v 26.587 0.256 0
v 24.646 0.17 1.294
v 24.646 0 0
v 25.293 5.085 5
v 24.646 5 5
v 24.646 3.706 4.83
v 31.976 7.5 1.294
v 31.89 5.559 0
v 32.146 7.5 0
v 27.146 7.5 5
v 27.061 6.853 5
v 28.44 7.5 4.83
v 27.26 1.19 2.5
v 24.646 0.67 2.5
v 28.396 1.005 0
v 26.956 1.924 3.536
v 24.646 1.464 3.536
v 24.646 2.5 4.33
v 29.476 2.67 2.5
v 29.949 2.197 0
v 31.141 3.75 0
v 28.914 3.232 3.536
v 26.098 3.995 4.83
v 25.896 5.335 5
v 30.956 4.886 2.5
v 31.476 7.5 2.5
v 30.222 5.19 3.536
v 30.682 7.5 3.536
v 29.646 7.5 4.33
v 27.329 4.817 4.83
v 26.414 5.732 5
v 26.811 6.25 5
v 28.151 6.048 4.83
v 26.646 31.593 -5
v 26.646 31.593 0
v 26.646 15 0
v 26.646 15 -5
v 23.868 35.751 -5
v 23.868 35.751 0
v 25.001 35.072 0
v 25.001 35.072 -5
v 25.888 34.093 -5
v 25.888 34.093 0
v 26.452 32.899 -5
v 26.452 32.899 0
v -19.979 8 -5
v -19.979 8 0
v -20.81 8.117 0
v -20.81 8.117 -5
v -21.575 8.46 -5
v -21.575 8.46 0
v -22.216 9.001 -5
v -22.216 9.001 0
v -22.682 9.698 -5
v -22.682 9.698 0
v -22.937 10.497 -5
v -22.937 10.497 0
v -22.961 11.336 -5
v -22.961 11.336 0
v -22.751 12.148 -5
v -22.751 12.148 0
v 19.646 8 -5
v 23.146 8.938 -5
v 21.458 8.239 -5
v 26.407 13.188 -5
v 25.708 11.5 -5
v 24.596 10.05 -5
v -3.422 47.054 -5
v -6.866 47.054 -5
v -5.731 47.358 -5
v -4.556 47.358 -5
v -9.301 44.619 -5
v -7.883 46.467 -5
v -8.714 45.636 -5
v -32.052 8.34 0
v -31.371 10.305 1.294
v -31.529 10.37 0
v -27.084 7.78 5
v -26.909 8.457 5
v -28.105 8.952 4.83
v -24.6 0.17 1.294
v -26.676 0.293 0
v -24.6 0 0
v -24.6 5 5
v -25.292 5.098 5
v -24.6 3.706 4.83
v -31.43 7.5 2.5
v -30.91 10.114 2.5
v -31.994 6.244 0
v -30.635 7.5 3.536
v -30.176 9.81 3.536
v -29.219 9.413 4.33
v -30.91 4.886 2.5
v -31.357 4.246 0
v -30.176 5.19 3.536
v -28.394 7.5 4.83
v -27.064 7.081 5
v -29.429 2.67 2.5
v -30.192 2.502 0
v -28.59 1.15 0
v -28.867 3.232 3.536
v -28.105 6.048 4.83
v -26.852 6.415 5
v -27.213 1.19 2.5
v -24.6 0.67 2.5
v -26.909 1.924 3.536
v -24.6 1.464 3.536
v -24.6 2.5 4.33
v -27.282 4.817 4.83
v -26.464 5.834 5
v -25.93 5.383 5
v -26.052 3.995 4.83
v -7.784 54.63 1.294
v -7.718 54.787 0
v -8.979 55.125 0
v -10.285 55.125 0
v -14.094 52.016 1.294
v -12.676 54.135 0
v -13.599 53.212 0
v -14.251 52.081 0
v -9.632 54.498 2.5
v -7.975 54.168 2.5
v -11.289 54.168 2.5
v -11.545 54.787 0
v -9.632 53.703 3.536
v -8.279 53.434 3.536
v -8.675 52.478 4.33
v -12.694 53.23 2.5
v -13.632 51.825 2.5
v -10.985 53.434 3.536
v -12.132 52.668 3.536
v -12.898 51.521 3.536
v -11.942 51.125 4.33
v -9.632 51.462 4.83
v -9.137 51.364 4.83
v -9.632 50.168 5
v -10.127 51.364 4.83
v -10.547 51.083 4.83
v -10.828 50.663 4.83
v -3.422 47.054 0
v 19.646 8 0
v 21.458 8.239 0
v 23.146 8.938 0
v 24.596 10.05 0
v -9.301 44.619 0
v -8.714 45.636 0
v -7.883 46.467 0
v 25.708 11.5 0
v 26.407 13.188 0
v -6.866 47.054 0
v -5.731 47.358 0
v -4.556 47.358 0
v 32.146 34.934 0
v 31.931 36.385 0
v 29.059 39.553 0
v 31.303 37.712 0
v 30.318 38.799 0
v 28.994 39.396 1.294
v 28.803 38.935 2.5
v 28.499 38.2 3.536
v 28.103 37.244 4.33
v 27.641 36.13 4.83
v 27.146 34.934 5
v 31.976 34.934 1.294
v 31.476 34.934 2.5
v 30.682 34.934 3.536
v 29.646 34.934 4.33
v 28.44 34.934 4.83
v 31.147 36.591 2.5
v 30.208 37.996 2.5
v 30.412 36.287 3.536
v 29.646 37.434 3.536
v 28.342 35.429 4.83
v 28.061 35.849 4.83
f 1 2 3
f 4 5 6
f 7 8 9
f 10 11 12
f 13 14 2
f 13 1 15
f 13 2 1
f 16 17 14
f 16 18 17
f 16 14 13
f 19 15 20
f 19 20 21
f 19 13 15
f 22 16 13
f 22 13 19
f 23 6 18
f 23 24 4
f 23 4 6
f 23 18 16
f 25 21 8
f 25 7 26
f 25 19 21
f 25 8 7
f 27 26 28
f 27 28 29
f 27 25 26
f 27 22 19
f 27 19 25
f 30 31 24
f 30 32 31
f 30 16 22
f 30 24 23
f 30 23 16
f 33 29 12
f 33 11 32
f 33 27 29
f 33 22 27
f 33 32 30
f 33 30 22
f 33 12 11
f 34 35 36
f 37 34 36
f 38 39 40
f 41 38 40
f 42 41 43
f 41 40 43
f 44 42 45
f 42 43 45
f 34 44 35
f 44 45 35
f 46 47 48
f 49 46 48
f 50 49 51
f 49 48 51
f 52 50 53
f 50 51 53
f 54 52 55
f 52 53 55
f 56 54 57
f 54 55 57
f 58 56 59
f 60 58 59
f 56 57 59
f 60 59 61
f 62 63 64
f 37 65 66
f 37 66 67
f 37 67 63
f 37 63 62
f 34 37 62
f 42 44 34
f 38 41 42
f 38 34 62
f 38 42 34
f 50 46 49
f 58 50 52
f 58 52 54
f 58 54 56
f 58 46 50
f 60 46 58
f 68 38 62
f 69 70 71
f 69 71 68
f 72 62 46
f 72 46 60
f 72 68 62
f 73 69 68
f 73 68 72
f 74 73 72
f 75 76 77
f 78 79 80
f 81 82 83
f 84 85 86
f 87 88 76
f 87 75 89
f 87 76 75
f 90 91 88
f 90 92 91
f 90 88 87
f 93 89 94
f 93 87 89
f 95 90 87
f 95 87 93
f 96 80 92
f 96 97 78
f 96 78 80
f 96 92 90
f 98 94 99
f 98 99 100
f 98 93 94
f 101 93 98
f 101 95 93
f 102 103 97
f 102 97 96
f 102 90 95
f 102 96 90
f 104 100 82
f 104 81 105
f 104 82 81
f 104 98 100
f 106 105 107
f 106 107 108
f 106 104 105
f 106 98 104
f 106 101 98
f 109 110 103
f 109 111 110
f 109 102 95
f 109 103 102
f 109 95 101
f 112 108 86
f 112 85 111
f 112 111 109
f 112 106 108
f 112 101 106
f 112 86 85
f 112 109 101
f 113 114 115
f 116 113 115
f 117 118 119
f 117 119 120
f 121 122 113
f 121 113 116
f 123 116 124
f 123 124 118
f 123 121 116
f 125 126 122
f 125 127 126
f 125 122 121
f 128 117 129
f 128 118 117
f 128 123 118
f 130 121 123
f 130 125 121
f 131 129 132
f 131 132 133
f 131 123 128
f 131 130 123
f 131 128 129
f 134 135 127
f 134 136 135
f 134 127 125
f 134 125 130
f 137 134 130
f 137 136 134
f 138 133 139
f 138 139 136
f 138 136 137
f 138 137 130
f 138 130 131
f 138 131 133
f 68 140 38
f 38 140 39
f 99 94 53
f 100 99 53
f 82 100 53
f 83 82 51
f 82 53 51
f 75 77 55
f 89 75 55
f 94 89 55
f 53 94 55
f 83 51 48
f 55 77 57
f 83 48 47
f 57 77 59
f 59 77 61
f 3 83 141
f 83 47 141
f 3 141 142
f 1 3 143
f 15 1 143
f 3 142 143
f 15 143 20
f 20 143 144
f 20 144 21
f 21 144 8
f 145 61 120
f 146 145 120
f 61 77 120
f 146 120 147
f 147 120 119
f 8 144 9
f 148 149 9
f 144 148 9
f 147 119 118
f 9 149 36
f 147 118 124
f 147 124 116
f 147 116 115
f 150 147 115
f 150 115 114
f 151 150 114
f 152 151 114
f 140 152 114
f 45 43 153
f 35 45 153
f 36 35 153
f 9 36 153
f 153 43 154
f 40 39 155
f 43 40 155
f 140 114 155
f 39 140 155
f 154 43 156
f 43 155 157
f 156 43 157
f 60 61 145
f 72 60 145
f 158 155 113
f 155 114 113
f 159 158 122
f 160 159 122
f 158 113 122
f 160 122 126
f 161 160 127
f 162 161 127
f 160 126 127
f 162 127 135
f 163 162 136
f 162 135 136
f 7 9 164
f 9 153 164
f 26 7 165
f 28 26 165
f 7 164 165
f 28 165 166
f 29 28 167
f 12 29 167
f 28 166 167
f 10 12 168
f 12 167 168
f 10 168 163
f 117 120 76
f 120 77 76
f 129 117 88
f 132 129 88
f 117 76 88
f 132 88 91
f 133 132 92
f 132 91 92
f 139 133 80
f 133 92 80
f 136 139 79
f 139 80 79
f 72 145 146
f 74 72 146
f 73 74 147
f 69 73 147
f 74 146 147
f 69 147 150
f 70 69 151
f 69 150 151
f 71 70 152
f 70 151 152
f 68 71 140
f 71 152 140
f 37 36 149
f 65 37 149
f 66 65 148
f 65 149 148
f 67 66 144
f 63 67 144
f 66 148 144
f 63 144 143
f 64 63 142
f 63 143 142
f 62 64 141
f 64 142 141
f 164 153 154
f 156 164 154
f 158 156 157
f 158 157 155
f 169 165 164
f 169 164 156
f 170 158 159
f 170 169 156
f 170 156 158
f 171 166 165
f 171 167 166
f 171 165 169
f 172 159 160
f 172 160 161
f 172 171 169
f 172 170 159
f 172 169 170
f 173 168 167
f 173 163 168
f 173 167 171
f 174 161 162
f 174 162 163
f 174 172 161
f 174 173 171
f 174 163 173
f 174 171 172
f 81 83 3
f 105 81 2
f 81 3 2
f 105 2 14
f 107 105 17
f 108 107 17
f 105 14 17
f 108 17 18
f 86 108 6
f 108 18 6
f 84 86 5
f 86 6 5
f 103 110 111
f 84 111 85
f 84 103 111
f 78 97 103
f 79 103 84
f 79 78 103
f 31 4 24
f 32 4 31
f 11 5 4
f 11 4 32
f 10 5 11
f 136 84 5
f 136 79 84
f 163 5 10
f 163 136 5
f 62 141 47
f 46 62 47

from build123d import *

# Parameters (mm, degrees)
BOSS_EXTRUDE1_DEPTH = 5
BOSS_EXTRUDE2_DEPTH = 5
FILLET1_R           = 5


with BuildPart() as part:
    # Sketch1 → Boss-Extrude1 (new body)
    # profile 1 of 3: a face of its own
    with BuildSketch(Plane.XY):
        with BuildLine():
            Line((32.146013204, 7.5), (32.146013204, 34.934018325))
            ThreePointArc((32.146013204, 34.934018325), (31.303361266, 37.71186949), (29.059430366, 39.553415988))
            Line((29.059430366, 39.553415988), (-7.718495765, 54.787331787))
            ThreePointArc((-7.718495765, 54.787331787), (-11.545330089, 54.787331787), (-14.25131059, 52.081351287))
            Line((-14.25131059, 52.081351287), (-31.528665913, 10.370125743))
            ThreePointArc((-31.528665913, 10.370125743), (-30.835591512, 3.333223252), (-24.599569419, 0))
            Line((-24.599569419, 0), (24.646013204, 0))
            ThreePointArc((24.646013204, 0), (29.949314063, 2.196699141), (32.146013204, 7.5))
        make_face()
        with BuildLine():
            ThreePointArc((27.146013204, 31.593125136), (26.303361266, 34.370976301), (24.059430366, 36.212522798))
            Line((24.059430366, 36.212522798), (-3.230262498, 47.516283695))
            ThreePointArc((-3.230262498, 47.516283695), (-7.057096821, 47.516283695), (-9.763077322, 44.810303195))
            Line((-9.763077322, 44.810303195), (-23.212969116, 12.339392013))
            ThreePointArc((-23.212969116, 12.339392013), (-22.889534395, 9.055504184), (-19.979390752, 7.5))
            Line((-19.979390752, 7.5), (19.646013204, 7.5))
            ThreePointArc((19.646013204, 7.5), (24.949314063, 9.696699141), (27.146013204, 15))
            Line((27.146013204, 15), (27.146013204, 31.593125136))
        make_face(mode=Mode.SUBTRACT)
    # profile 2 of 3: a face of its own
    with BuildSketch(Plane.XY):
        with BuildLine():
            Line((27.146013204, 31.593125136), (27.146013204, 15))
            ThreePointArc((27.146013204, 15), (24.949314063, 9.696699141), (19.646013204, 7.5))
            Line((19.646013204, 7.5), (-19.979390752, 7.5))
            ThreePointArc((-19.979390752, 7.5), (-22.889534395, 9.055504184), (-23.212969116, 12.339392013))
            Line((-23.212969116, 12.339392013), (-9.763077322, 44.810303195))
            ThreePointArc((-9.763077322, 44.810303195), (-7.057096821, 47.516283695), (-3.230262498, 47.516283695))
            Line((-3.230262498, 47.516283695), (24.059430366, 36.212522798))
            ThreePointArc((24.059430366, 36.212522798), (26.303361266, 34.370976301), (27.146013204, 31.593125136))
        make_face()
    # profile 3 of 3: a face of its own
    with BuildSketch(Plane.XY):
        with BuildLine():
            Line((26.646013204, 31.593125136), (26.646013204, 15))
            ThreePointArc((26.646013204, 15), (24.595760673, 10.050252532), (19.646013204, 8))
            Line((19.646013204, 8), (-19.979390752, 8))
            ThreePointArc((-19.979390752, 8), (-22.473799589, 9.333289301), (-22.75102935, 12.148050297))
            Line((-22.75102935, 12.148050297), (-9.301137556, 44.618961479))
            ThreePointArc((-9.301137556, 44.618961479), (-6.865755105, 47.054343929), (-3.421604214, 47.054343929))
            Line((-3.421604214, 47.054343929), (23.86808865, 35.750583032))
            ThreePointArc((23.86808865, 35.750583032), (25.88762646, 34.093191184), (26.646013204, 31.593125136))
        make_face()
    extrude(amount=BOSS_EXTRUDE1_DEPTH)

    # Sketch1<4> → Boss-Extrude2 (add)
    with BuildSketch(Plane.XY):
        with BuildLine():
            Line((26.646013204, 31.593125136), (26.646013204, 15))
            ThreePointArc((26.646013204, 15), (24.595760673, 10.050252532), (19.646013204, 8))
            Line((19.646013204, 8), (-19.979390752, 8))
            ThreePointArc((-19.979390752, 8), (-22.473799589, 9.333289301), (-22.75102935, 12.148050297))
            Line((-22.75102935, 12.148050297), (-9.301137556, 44.618961479))
            ThreePointArc((-9.301137556, 44.618961479), (-6.865755105, 47.054343929), (-3.421604214, 47.054343929))
            Line((-3.421604214, 47.054343929), (23.86808865, 35.750583032))
            ThreePointArc((23.86808865, 35.750583032), (25.88762646, 34.093191184), (26.646013204, 31.593125136))
        make_face()
    extrude(amount=-BOSS_EXTRUDE2_DEPTH)

    # Fillet1
    fillet1_edges = [part.edges().sort_by_distance(p)[0] for p in [
        (29.949314063, 2.196699141, 5),
        (0.023221893, 0, 5),
        (-30.835591512, 3.333223252, 5),
        (-22.889988251, 31.225738515, 5),
        (-11.545330089, 54.787331787, 5),
        (10.670467301, 47.170373888, 5),
        (31.303361266, 37.71186949, 5),
        (32.146013204, 21.217009163, 5),
    ]]
    fillet(fillet1_edges, radius=FILLET1_R - 0.0001)  # a hair under: the kernel refuses the full size


solid = part.part
